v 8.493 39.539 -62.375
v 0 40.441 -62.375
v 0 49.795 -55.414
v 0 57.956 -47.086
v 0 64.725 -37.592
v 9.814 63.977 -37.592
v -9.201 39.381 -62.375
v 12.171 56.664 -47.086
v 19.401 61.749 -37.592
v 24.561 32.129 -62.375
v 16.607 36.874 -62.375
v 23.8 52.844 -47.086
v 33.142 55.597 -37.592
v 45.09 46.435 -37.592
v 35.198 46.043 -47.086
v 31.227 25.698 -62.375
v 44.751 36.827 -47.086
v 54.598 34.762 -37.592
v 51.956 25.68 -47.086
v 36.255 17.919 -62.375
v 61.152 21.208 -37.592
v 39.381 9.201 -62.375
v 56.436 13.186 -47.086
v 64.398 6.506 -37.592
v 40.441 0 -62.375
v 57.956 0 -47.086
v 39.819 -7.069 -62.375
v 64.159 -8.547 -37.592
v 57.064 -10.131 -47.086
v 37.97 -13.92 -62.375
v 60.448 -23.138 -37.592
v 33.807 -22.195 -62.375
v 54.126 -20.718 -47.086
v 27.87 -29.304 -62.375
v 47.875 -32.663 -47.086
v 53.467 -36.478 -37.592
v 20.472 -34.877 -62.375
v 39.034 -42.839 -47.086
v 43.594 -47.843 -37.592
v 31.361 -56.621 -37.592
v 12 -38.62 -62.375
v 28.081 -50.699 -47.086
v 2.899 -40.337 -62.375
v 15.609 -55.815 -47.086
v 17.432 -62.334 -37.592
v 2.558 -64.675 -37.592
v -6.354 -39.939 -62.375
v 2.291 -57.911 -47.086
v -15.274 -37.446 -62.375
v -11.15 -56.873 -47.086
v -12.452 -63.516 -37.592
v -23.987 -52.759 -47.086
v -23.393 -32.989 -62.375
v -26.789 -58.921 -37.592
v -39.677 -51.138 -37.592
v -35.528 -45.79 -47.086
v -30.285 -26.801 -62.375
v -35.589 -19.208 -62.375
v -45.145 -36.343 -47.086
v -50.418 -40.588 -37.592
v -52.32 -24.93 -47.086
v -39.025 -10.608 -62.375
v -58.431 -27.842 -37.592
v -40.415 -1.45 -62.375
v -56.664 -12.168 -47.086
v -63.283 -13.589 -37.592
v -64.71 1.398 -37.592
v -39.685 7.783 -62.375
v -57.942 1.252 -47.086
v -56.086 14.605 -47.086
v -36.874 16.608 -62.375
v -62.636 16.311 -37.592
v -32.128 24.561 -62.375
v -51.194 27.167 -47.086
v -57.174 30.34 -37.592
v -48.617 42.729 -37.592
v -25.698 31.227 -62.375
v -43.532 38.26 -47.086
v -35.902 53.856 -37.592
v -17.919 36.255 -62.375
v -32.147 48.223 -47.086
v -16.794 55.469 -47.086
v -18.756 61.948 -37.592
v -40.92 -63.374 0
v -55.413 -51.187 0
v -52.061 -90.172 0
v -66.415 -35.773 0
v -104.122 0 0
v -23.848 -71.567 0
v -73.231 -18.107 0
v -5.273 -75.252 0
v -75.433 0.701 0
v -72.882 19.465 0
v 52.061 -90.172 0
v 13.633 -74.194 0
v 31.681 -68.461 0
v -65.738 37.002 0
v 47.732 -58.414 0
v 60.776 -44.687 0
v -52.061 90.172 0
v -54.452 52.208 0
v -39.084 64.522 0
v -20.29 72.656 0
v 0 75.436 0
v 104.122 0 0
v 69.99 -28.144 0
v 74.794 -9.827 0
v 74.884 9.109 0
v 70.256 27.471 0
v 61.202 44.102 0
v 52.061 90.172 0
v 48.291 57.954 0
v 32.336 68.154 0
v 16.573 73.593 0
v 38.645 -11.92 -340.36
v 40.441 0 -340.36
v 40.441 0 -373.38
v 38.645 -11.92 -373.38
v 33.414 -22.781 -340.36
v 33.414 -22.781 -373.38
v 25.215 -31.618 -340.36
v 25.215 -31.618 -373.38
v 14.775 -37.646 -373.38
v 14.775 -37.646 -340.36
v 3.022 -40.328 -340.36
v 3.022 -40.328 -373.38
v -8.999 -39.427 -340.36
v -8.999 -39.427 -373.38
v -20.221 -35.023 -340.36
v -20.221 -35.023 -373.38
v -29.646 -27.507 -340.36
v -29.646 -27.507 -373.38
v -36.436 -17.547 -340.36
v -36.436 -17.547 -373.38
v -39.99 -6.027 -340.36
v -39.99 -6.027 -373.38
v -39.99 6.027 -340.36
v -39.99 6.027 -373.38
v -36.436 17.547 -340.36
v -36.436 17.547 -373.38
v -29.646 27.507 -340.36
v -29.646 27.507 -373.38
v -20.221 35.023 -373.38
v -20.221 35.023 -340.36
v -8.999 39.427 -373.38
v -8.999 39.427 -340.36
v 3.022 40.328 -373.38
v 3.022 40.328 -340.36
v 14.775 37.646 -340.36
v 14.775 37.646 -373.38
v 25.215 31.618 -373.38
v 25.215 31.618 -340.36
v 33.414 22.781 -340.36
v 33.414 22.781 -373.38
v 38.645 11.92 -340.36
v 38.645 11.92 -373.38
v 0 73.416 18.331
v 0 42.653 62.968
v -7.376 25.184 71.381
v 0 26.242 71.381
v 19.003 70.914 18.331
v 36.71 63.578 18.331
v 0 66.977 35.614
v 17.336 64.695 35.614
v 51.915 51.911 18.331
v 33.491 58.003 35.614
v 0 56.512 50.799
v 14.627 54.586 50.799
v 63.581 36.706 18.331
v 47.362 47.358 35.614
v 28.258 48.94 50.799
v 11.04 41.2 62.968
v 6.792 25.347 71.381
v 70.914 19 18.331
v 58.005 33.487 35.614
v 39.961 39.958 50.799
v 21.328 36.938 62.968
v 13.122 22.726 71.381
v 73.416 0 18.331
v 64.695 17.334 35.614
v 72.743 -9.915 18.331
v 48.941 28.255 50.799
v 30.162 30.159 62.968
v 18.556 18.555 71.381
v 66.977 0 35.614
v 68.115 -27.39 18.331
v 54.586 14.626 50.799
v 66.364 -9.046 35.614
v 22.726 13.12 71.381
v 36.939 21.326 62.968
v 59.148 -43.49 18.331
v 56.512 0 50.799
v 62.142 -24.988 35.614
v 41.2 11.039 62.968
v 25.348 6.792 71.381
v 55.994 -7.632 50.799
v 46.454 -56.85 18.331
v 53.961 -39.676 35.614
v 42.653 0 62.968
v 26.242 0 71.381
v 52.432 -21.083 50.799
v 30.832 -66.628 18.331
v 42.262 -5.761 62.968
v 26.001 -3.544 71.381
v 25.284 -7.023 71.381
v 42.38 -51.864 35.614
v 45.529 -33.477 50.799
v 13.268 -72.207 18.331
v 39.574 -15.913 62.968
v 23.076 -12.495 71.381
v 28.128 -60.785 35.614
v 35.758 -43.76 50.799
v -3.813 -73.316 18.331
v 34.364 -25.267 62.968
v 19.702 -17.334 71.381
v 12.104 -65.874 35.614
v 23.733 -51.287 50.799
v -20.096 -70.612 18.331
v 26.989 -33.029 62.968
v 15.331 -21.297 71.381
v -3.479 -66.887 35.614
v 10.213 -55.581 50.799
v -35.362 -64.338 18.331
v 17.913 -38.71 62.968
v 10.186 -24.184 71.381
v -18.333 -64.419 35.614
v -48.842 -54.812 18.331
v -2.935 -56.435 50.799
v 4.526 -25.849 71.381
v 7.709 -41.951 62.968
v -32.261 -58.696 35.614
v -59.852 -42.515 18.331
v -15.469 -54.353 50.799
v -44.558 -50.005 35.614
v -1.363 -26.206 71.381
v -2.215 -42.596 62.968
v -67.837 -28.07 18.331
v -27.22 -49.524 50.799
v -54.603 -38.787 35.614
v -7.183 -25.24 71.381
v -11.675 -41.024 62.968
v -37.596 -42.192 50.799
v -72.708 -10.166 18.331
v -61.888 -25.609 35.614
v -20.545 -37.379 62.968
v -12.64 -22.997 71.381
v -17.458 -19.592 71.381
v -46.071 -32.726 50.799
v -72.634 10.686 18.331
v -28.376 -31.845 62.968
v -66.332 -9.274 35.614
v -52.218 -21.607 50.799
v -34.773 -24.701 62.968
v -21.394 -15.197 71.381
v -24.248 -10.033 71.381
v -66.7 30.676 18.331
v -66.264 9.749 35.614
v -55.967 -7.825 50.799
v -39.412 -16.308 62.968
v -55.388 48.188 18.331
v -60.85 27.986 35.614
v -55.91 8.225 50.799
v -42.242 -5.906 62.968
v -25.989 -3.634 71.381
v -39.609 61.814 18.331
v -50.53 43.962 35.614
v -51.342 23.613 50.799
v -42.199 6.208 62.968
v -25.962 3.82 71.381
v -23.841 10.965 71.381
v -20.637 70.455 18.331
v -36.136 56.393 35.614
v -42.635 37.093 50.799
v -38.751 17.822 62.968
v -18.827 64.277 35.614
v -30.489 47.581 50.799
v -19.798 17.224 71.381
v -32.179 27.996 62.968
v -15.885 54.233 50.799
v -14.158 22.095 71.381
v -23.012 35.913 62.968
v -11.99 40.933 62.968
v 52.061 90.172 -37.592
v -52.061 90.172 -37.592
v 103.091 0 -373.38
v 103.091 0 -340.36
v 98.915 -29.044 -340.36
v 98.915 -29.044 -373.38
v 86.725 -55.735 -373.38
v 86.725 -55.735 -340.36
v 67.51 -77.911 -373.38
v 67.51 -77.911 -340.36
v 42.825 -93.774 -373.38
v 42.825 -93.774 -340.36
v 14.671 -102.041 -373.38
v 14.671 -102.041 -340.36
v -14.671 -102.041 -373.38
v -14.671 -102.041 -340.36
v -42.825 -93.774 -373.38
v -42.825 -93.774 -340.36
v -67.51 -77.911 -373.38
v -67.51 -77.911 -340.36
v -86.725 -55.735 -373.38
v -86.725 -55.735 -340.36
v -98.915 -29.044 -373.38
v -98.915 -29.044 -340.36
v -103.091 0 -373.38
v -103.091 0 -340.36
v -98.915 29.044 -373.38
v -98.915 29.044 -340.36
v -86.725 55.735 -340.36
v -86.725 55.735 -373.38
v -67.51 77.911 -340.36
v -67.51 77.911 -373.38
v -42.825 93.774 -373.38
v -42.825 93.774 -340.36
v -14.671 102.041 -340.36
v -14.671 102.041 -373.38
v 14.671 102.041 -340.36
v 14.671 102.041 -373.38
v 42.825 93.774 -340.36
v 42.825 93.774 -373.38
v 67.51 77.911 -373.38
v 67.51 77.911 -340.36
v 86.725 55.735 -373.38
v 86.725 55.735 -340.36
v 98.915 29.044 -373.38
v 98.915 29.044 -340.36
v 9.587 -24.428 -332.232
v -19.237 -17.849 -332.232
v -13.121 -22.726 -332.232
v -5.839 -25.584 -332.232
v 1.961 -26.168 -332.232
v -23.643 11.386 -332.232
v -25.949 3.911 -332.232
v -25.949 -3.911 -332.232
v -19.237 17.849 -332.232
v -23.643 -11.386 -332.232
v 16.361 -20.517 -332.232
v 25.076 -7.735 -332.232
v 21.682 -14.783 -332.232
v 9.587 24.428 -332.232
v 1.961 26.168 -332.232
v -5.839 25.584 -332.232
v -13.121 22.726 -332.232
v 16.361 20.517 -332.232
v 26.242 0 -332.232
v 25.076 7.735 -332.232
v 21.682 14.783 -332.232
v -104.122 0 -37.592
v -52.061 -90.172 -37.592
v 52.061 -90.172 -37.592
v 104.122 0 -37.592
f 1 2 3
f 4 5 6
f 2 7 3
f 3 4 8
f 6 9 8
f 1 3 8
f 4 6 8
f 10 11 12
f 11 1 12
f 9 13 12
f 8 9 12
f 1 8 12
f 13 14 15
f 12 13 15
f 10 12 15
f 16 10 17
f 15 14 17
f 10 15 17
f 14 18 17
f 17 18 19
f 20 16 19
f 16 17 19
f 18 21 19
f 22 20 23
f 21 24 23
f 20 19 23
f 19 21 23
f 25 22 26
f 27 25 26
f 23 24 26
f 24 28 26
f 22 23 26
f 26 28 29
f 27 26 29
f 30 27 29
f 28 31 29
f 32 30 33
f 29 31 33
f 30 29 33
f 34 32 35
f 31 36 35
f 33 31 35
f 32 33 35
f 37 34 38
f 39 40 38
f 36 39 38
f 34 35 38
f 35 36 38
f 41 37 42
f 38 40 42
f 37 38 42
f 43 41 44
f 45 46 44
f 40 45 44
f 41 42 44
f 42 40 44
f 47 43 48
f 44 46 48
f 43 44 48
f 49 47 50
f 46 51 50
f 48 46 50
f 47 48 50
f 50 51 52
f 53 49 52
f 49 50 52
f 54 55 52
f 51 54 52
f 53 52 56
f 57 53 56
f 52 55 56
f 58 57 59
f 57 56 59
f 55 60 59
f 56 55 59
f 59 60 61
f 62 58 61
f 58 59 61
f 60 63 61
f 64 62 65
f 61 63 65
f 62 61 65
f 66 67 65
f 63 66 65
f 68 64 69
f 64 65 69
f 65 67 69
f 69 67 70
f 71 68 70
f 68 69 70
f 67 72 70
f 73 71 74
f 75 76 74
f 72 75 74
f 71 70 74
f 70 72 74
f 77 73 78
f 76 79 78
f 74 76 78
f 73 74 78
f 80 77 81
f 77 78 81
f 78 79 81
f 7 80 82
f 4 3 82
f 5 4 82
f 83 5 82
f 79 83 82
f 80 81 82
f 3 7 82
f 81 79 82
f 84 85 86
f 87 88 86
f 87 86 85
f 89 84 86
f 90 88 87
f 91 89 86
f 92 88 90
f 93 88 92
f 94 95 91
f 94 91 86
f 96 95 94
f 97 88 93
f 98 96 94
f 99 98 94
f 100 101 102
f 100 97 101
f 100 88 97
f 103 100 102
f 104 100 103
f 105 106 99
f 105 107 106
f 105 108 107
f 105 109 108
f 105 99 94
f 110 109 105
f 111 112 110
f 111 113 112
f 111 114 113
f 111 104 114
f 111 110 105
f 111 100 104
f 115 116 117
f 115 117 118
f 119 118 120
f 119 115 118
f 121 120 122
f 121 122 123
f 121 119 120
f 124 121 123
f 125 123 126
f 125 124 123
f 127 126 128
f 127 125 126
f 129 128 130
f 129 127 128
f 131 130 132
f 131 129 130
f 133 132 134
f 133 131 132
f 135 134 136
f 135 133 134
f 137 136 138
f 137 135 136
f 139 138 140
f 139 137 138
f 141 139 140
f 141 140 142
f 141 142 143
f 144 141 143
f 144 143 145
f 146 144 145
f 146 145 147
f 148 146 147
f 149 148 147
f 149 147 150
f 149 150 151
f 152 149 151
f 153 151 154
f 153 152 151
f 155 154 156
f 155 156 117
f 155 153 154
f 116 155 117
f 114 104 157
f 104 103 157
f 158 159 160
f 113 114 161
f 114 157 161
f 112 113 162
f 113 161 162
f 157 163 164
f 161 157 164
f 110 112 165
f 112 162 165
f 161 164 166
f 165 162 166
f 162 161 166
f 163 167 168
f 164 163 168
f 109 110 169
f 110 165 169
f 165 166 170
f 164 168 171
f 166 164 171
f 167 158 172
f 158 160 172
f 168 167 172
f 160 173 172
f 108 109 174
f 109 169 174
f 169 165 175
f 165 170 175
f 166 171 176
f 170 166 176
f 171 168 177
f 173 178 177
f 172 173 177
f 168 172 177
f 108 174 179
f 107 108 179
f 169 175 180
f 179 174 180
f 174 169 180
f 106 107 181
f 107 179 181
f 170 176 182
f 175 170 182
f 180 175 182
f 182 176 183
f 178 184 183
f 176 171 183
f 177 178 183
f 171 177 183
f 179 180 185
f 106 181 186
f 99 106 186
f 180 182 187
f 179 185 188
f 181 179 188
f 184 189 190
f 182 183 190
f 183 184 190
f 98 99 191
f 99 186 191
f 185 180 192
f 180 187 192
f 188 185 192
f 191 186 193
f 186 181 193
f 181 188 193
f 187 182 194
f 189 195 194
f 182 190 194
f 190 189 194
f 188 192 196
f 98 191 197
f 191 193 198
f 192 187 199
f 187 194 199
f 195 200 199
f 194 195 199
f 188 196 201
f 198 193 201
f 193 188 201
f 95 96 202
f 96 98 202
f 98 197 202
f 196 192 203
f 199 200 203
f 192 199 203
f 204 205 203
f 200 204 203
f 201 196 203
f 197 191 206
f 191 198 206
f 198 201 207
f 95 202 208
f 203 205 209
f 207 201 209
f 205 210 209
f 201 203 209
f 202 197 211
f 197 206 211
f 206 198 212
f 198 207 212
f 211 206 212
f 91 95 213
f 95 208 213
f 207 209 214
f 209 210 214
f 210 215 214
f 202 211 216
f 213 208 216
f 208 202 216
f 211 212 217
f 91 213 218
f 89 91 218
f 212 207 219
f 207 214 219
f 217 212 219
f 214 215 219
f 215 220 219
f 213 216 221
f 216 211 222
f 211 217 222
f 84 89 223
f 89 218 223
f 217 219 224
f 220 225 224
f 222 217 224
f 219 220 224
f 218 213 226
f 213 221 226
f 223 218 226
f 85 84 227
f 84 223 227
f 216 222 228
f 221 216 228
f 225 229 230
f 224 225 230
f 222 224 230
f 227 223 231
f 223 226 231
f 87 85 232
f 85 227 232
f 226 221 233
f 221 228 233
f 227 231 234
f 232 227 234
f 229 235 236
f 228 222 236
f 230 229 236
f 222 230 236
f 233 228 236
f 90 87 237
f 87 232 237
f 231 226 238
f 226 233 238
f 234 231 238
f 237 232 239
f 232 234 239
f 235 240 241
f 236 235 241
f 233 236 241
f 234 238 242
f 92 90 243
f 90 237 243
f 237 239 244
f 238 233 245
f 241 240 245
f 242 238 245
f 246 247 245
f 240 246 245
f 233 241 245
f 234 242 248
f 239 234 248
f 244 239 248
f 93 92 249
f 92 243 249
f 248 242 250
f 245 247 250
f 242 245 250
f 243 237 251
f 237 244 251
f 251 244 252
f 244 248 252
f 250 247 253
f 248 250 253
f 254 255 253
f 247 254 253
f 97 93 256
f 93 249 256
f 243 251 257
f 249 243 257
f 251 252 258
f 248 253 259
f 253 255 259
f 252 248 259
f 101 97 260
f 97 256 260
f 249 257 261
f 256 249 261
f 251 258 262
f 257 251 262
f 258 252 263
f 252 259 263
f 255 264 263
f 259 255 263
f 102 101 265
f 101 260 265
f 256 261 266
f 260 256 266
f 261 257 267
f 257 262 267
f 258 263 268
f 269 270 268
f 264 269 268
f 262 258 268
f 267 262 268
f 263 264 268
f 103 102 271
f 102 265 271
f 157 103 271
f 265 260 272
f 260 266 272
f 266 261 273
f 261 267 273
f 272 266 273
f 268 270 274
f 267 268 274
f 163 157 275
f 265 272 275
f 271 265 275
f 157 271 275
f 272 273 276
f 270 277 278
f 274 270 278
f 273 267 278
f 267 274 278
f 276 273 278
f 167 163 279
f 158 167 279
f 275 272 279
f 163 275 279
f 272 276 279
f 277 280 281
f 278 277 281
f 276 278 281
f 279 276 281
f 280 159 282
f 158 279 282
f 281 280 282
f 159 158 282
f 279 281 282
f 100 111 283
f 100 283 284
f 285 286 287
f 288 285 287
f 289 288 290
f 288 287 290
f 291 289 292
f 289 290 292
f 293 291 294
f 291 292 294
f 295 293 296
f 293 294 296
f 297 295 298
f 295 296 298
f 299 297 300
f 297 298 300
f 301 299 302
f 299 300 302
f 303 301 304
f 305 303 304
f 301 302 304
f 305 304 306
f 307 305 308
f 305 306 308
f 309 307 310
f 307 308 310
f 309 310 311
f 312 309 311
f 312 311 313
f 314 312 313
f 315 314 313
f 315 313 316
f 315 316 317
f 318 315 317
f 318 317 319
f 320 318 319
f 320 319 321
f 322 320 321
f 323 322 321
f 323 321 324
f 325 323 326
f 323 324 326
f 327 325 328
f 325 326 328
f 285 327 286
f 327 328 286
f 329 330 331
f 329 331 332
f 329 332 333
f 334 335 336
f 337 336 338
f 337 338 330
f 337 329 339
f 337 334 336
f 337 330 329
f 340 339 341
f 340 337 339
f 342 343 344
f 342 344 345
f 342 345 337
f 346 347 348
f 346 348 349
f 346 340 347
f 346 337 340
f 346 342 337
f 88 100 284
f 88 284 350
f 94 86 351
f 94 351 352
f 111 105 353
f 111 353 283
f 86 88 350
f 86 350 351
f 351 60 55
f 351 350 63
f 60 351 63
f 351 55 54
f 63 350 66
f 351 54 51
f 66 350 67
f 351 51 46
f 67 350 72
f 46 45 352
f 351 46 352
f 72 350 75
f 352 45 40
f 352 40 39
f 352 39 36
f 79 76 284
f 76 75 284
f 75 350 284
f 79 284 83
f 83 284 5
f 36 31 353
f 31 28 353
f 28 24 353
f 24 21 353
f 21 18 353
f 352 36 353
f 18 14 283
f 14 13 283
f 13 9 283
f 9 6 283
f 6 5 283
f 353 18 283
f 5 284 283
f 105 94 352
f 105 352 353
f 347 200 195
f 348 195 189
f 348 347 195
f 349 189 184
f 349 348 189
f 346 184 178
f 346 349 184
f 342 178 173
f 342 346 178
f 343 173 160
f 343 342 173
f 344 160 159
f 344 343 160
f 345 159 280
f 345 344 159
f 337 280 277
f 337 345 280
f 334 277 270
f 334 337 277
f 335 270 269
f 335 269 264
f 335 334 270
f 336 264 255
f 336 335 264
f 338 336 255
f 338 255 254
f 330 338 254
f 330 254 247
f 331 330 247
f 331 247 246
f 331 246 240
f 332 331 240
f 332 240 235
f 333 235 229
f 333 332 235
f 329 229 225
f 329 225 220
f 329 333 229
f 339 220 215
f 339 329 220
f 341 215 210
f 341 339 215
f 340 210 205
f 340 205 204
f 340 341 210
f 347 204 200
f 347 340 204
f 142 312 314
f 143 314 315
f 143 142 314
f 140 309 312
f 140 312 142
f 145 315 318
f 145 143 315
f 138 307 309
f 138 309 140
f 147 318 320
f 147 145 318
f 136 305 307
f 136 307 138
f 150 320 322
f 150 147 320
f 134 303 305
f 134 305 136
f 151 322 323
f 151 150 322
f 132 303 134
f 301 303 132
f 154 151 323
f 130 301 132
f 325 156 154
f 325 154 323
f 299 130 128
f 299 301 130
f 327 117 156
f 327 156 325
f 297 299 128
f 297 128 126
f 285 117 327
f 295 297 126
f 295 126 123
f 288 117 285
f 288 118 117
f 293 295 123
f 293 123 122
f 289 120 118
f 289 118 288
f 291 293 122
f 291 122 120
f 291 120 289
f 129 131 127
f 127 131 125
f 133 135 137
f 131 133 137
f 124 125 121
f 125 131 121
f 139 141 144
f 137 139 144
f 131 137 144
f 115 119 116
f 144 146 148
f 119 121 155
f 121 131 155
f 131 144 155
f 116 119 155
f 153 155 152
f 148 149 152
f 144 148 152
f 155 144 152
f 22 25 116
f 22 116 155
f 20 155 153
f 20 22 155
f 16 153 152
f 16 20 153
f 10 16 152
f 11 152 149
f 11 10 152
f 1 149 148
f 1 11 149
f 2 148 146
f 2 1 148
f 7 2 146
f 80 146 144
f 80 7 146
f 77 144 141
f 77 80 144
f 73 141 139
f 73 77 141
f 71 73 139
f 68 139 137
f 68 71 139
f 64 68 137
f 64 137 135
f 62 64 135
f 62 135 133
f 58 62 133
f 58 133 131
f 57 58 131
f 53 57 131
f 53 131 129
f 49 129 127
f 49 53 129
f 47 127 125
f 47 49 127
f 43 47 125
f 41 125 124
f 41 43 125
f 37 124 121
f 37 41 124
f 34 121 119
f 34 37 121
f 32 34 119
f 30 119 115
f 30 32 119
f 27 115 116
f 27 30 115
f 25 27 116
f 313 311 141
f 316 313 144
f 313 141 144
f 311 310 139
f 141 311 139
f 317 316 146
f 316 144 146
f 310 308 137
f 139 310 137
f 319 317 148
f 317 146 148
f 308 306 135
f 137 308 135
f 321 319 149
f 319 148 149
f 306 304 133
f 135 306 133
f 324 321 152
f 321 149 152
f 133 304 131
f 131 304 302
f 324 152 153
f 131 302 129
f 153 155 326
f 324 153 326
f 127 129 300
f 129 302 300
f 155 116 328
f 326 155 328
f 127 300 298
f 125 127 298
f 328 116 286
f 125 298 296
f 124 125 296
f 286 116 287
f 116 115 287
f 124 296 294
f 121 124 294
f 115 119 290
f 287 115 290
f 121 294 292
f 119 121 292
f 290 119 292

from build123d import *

# Parameters (mm, degrees)
F2_R      = 40.441348
F3_DEPTH  = 340.36
F5_DEPTH  = 37.592
F6_R      = 26.241786
F7_DEPTH  = 332.232
F8_DEPTH  = 170.434
F9_R      = 103.090547
F9_R_2    = 40.441348
F10_DEPTH = 33.02


with BuildPart() as f1:
    # F0 (on Right) → F1 (revolve)
    with BuildSketch(Plane.YZ):
        with BuildLine():
            Line((0, 75.929344), (0, -73.889017))
            ThreePointArc((0, -73.889017), (75.443219, 1.020163), (0, 75.929344))
        make_face()
    revolve(axis=Axis((0, 0, 1.020163), (0, 0, -1)))

    # F2 (on Top) → F3 (join)
    with BuildSketch(Plane.XY):
        Circle(F2_R)
    extrude(amount=-F3_DEPTH)

    # F4 (on Top) → F5 (join)
    with BuildSketch(Plane.XY):
        Polygon((52.060962, 90.172231), (-52.060962, 90.172231), (-104.121924, 0), (-52.060962, -90.172231), (52.060962, -90.172231), (104.121924, 0), align=None)
    extrude(amount=-F5_DEPTH)

    # F6 (on Top) → F7 (cut)
    with BuildSketch(Plane.XY):
        Circle(F6_R)
    extrude(amount=-F7_DEPTH, mode=Mode.SUBTRACT)

    # F6 (on Top) → F8 (cut)
    with BuildSketch(Plane.XY):
        Circle(F6_R)
    extrude(amount=F8_DEPTH, mode=Mode.SUBTRACT)


with BuildPart() as f10:
    # F9 (on face) → F10 (new body)
    with BuildSketch(Plane(origin=(0, 0, -340.36), x_dir=(1, 0, 0), z_dir=(0, 0, -1))):
        Circle(F9_R)
        Circle(F9_R_2, mode=Mode.SUBTRACT)
    extrude(amount=F10_DEPTH)


solid = Compound([f1.part, f10.part])
